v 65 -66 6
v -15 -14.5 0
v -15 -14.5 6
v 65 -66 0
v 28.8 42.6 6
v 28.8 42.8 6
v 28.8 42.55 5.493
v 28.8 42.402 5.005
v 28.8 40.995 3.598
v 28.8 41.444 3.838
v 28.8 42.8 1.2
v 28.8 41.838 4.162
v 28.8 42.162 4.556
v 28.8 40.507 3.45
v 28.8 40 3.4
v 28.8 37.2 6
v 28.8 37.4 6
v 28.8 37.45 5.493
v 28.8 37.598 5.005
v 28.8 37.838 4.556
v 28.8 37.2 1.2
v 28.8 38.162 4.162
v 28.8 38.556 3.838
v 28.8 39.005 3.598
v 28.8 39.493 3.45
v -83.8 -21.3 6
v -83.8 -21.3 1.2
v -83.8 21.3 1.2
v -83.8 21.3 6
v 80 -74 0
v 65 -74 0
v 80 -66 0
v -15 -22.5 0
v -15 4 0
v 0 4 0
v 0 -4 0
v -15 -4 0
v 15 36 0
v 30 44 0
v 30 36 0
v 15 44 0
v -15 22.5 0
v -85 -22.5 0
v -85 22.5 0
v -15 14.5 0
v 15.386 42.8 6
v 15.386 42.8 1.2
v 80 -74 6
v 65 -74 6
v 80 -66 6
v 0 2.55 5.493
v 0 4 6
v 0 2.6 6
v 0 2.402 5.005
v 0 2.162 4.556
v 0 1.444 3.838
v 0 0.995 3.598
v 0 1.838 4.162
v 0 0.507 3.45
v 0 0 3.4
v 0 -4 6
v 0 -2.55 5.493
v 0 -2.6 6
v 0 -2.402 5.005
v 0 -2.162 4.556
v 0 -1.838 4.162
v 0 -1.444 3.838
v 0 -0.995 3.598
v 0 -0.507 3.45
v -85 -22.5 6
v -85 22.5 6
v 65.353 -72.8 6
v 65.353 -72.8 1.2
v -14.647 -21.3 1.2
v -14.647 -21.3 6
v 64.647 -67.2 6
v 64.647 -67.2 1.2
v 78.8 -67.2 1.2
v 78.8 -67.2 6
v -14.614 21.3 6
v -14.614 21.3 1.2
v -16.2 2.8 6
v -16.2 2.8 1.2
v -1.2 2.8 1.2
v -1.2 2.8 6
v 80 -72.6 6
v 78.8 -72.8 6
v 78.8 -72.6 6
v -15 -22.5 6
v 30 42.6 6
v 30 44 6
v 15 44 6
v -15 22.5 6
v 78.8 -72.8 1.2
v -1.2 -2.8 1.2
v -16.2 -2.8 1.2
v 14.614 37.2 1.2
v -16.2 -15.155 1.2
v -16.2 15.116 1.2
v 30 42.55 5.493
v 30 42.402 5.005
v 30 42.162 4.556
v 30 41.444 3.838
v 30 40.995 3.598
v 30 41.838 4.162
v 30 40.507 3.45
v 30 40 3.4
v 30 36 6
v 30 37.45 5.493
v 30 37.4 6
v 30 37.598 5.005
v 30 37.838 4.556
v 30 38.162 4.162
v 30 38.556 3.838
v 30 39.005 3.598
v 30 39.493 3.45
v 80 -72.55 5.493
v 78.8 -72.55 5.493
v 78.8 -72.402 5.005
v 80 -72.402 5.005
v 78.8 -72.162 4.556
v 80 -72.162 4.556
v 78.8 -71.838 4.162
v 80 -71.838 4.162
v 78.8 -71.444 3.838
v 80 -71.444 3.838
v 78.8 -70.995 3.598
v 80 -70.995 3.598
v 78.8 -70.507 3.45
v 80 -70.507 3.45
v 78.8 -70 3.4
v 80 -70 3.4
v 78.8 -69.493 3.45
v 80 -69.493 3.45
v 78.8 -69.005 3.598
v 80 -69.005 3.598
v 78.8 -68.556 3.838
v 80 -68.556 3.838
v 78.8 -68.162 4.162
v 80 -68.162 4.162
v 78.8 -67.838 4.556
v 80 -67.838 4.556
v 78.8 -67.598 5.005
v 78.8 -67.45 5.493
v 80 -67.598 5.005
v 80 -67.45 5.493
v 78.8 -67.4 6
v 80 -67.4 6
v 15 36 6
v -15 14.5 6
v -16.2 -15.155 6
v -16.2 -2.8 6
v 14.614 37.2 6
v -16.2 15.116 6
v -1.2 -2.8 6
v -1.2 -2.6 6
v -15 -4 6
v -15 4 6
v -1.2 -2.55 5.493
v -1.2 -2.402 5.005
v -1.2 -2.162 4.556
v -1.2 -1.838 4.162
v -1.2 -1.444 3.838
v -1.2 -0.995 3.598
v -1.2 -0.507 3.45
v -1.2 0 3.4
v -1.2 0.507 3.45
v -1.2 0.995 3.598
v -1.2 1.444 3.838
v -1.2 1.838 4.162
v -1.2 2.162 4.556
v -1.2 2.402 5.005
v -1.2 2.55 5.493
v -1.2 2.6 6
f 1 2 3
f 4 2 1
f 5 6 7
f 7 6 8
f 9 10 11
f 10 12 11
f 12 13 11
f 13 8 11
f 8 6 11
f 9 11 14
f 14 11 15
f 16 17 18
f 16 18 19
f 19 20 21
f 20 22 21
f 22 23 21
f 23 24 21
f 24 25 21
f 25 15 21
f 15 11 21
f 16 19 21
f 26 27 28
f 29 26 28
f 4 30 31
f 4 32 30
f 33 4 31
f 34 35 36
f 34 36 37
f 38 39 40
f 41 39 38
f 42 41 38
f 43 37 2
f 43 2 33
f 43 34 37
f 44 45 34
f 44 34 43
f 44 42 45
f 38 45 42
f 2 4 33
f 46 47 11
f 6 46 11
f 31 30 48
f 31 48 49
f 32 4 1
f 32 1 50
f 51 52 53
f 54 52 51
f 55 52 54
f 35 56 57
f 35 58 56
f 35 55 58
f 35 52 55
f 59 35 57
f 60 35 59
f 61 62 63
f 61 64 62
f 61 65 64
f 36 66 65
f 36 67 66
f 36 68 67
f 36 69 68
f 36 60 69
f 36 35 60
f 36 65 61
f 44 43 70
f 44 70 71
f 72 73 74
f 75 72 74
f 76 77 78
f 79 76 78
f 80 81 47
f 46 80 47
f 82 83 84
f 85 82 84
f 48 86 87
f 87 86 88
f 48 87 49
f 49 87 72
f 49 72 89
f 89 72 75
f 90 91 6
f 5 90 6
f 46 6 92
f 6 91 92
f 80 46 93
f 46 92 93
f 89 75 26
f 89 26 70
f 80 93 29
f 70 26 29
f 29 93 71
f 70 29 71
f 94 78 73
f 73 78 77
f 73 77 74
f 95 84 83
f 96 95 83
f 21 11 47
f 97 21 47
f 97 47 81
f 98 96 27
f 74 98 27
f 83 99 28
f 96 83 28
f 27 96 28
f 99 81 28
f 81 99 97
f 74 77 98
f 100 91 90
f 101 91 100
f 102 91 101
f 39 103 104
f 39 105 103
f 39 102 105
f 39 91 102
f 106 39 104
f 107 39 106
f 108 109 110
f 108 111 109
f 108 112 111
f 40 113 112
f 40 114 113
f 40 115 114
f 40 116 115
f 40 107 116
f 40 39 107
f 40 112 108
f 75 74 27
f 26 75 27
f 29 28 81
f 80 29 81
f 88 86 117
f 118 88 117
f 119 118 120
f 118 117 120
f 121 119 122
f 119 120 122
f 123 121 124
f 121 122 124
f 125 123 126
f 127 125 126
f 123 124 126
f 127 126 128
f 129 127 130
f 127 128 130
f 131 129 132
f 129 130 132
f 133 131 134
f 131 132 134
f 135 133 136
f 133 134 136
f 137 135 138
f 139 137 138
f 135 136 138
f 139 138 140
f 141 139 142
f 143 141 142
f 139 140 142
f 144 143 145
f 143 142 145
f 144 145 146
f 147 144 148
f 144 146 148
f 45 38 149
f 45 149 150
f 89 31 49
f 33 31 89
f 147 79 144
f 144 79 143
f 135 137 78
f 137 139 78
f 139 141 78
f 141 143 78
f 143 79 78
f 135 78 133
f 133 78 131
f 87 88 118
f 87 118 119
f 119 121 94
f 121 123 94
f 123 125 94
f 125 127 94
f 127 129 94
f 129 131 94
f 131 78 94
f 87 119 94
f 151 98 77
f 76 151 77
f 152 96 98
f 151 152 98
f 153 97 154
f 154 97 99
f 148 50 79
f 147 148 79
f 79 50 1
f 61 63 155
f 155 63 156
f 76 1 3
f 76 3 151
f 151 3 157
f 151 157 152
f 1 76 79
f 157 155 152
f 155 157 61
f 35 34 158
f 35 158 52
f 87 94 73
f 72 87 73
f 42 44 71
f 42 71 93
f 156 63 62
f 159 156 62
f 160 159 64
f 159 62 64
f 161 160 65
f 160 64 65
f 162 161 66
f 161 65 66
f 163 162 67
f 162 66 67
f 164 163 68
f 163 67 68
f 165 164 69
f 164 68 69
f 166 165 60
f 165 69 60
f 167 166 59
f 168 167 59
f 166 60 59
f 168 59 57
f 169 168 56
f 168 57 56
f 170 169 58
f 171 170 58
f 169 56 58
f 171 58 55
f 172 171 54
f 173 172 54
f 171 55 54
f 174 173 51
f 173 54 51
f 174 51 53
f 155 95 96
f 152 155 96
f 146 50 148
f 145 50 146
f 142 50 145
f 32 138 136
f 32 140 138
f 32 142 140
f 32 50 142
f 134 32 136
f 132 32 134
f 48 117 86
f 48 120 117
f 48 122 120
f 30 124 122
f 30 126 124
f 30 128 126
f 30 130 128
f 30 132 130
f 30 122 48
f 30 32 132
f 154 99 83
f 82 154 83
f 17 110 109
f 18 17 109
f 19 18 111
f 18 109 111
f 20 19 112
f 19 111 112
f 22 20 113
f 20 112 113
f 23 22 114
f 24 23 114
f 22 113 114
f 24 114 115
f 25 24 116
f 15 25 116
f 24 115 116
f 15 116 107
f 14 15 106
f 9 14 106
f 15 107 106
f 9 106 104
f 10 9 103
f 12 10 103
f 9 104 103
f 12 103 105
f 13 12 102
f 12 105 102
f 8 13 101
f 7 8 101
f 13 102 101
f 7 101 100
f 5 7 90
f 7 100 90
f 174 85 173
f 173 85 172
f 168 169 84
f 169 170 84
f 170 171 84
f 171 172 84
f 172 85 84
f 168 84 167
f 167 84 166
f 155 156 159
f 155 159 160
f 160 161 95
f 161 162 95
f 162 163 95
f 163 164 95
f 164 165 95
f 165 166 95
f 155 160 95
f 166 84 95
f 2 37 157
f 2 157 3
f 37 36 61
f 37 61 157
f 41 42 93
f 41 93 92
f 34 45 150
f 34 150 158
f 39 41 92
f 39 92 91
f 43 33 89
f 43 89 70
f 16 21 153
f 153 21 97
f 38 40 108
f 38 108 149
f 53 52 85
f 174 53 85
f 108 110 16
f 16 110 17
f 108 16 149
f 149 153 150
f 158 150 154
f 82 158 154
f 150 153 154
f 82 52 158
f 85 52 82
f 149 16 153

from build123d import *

# Parameters (mm, degrees)
PAD_DEPTH       = 6
THICKNESS_T     = -1.2
SKETCH001_R     = 2.6
POCKET_DEPTH    = 1.2
SKETCH002_R     = 2.6
POCKET001_DEPTH = 1.2
SKETCH003_R     = 2.6
POCKET002_DEPTH = 1.2


with BuildPart() as part:
    # Sketch → Pad (new body)
    with BuildSketch(Plane.XY):
        Polygon((80, -74), (65, -74), (-15, -22.5), (-85, -22.5), (-85, 22.5), (-15, 22.5), (15, 44), (30, 44), (30, 36), (15, 36), (-15, 14.5), (-15, 4), (0, 4), (0, -4), (-15, -4), (-15, -14.5), (65, -66), (80, -66), align=None)
    extrude(amount=PAD_DEPTH)

    # Thickness
    thickness_openings = [part.faces().sort_by_distance(p)[0] for p in [
        (-29.840547, -5.671982, 6),
    ]]
    offset(amount=THICKNESS_T, openings=thickness_openings, kind=Kind.INTERSECTION)

    # Sketch001 (on Face13 of Thickness) → Pocket (cut)
    with BuildSketch(Plane.YZ):
        with Locations((0, 6)):
            Circle(SKETCH001_R)
    extrude(amount=-POCKET_DEPTH, mode=Mode.SUBTRACT)

    # Sketch002 (on Face12 of Pocket) → Pocket001 (cut)
    with BuildSketch(Plane.YZ.offset(30)):
        with Locations((40, 6)):
            Circle(SKETCH002_R)
    extrude(amount=-POCKET001_DEPTH, mode=Mode.SUBTRACT)

    # Sketch003 (on Face2 of Pocket001) → Pocket002 (cut)
    with BuildSketch(Plane.YZ.offset(80)):
        with Locations((-70, 6)):
            Circle(SKETCH003_R)
    extrude(amount=-POCKET002_DEPTH, mode=Mode.SUBTRACT)


solid = part.part
